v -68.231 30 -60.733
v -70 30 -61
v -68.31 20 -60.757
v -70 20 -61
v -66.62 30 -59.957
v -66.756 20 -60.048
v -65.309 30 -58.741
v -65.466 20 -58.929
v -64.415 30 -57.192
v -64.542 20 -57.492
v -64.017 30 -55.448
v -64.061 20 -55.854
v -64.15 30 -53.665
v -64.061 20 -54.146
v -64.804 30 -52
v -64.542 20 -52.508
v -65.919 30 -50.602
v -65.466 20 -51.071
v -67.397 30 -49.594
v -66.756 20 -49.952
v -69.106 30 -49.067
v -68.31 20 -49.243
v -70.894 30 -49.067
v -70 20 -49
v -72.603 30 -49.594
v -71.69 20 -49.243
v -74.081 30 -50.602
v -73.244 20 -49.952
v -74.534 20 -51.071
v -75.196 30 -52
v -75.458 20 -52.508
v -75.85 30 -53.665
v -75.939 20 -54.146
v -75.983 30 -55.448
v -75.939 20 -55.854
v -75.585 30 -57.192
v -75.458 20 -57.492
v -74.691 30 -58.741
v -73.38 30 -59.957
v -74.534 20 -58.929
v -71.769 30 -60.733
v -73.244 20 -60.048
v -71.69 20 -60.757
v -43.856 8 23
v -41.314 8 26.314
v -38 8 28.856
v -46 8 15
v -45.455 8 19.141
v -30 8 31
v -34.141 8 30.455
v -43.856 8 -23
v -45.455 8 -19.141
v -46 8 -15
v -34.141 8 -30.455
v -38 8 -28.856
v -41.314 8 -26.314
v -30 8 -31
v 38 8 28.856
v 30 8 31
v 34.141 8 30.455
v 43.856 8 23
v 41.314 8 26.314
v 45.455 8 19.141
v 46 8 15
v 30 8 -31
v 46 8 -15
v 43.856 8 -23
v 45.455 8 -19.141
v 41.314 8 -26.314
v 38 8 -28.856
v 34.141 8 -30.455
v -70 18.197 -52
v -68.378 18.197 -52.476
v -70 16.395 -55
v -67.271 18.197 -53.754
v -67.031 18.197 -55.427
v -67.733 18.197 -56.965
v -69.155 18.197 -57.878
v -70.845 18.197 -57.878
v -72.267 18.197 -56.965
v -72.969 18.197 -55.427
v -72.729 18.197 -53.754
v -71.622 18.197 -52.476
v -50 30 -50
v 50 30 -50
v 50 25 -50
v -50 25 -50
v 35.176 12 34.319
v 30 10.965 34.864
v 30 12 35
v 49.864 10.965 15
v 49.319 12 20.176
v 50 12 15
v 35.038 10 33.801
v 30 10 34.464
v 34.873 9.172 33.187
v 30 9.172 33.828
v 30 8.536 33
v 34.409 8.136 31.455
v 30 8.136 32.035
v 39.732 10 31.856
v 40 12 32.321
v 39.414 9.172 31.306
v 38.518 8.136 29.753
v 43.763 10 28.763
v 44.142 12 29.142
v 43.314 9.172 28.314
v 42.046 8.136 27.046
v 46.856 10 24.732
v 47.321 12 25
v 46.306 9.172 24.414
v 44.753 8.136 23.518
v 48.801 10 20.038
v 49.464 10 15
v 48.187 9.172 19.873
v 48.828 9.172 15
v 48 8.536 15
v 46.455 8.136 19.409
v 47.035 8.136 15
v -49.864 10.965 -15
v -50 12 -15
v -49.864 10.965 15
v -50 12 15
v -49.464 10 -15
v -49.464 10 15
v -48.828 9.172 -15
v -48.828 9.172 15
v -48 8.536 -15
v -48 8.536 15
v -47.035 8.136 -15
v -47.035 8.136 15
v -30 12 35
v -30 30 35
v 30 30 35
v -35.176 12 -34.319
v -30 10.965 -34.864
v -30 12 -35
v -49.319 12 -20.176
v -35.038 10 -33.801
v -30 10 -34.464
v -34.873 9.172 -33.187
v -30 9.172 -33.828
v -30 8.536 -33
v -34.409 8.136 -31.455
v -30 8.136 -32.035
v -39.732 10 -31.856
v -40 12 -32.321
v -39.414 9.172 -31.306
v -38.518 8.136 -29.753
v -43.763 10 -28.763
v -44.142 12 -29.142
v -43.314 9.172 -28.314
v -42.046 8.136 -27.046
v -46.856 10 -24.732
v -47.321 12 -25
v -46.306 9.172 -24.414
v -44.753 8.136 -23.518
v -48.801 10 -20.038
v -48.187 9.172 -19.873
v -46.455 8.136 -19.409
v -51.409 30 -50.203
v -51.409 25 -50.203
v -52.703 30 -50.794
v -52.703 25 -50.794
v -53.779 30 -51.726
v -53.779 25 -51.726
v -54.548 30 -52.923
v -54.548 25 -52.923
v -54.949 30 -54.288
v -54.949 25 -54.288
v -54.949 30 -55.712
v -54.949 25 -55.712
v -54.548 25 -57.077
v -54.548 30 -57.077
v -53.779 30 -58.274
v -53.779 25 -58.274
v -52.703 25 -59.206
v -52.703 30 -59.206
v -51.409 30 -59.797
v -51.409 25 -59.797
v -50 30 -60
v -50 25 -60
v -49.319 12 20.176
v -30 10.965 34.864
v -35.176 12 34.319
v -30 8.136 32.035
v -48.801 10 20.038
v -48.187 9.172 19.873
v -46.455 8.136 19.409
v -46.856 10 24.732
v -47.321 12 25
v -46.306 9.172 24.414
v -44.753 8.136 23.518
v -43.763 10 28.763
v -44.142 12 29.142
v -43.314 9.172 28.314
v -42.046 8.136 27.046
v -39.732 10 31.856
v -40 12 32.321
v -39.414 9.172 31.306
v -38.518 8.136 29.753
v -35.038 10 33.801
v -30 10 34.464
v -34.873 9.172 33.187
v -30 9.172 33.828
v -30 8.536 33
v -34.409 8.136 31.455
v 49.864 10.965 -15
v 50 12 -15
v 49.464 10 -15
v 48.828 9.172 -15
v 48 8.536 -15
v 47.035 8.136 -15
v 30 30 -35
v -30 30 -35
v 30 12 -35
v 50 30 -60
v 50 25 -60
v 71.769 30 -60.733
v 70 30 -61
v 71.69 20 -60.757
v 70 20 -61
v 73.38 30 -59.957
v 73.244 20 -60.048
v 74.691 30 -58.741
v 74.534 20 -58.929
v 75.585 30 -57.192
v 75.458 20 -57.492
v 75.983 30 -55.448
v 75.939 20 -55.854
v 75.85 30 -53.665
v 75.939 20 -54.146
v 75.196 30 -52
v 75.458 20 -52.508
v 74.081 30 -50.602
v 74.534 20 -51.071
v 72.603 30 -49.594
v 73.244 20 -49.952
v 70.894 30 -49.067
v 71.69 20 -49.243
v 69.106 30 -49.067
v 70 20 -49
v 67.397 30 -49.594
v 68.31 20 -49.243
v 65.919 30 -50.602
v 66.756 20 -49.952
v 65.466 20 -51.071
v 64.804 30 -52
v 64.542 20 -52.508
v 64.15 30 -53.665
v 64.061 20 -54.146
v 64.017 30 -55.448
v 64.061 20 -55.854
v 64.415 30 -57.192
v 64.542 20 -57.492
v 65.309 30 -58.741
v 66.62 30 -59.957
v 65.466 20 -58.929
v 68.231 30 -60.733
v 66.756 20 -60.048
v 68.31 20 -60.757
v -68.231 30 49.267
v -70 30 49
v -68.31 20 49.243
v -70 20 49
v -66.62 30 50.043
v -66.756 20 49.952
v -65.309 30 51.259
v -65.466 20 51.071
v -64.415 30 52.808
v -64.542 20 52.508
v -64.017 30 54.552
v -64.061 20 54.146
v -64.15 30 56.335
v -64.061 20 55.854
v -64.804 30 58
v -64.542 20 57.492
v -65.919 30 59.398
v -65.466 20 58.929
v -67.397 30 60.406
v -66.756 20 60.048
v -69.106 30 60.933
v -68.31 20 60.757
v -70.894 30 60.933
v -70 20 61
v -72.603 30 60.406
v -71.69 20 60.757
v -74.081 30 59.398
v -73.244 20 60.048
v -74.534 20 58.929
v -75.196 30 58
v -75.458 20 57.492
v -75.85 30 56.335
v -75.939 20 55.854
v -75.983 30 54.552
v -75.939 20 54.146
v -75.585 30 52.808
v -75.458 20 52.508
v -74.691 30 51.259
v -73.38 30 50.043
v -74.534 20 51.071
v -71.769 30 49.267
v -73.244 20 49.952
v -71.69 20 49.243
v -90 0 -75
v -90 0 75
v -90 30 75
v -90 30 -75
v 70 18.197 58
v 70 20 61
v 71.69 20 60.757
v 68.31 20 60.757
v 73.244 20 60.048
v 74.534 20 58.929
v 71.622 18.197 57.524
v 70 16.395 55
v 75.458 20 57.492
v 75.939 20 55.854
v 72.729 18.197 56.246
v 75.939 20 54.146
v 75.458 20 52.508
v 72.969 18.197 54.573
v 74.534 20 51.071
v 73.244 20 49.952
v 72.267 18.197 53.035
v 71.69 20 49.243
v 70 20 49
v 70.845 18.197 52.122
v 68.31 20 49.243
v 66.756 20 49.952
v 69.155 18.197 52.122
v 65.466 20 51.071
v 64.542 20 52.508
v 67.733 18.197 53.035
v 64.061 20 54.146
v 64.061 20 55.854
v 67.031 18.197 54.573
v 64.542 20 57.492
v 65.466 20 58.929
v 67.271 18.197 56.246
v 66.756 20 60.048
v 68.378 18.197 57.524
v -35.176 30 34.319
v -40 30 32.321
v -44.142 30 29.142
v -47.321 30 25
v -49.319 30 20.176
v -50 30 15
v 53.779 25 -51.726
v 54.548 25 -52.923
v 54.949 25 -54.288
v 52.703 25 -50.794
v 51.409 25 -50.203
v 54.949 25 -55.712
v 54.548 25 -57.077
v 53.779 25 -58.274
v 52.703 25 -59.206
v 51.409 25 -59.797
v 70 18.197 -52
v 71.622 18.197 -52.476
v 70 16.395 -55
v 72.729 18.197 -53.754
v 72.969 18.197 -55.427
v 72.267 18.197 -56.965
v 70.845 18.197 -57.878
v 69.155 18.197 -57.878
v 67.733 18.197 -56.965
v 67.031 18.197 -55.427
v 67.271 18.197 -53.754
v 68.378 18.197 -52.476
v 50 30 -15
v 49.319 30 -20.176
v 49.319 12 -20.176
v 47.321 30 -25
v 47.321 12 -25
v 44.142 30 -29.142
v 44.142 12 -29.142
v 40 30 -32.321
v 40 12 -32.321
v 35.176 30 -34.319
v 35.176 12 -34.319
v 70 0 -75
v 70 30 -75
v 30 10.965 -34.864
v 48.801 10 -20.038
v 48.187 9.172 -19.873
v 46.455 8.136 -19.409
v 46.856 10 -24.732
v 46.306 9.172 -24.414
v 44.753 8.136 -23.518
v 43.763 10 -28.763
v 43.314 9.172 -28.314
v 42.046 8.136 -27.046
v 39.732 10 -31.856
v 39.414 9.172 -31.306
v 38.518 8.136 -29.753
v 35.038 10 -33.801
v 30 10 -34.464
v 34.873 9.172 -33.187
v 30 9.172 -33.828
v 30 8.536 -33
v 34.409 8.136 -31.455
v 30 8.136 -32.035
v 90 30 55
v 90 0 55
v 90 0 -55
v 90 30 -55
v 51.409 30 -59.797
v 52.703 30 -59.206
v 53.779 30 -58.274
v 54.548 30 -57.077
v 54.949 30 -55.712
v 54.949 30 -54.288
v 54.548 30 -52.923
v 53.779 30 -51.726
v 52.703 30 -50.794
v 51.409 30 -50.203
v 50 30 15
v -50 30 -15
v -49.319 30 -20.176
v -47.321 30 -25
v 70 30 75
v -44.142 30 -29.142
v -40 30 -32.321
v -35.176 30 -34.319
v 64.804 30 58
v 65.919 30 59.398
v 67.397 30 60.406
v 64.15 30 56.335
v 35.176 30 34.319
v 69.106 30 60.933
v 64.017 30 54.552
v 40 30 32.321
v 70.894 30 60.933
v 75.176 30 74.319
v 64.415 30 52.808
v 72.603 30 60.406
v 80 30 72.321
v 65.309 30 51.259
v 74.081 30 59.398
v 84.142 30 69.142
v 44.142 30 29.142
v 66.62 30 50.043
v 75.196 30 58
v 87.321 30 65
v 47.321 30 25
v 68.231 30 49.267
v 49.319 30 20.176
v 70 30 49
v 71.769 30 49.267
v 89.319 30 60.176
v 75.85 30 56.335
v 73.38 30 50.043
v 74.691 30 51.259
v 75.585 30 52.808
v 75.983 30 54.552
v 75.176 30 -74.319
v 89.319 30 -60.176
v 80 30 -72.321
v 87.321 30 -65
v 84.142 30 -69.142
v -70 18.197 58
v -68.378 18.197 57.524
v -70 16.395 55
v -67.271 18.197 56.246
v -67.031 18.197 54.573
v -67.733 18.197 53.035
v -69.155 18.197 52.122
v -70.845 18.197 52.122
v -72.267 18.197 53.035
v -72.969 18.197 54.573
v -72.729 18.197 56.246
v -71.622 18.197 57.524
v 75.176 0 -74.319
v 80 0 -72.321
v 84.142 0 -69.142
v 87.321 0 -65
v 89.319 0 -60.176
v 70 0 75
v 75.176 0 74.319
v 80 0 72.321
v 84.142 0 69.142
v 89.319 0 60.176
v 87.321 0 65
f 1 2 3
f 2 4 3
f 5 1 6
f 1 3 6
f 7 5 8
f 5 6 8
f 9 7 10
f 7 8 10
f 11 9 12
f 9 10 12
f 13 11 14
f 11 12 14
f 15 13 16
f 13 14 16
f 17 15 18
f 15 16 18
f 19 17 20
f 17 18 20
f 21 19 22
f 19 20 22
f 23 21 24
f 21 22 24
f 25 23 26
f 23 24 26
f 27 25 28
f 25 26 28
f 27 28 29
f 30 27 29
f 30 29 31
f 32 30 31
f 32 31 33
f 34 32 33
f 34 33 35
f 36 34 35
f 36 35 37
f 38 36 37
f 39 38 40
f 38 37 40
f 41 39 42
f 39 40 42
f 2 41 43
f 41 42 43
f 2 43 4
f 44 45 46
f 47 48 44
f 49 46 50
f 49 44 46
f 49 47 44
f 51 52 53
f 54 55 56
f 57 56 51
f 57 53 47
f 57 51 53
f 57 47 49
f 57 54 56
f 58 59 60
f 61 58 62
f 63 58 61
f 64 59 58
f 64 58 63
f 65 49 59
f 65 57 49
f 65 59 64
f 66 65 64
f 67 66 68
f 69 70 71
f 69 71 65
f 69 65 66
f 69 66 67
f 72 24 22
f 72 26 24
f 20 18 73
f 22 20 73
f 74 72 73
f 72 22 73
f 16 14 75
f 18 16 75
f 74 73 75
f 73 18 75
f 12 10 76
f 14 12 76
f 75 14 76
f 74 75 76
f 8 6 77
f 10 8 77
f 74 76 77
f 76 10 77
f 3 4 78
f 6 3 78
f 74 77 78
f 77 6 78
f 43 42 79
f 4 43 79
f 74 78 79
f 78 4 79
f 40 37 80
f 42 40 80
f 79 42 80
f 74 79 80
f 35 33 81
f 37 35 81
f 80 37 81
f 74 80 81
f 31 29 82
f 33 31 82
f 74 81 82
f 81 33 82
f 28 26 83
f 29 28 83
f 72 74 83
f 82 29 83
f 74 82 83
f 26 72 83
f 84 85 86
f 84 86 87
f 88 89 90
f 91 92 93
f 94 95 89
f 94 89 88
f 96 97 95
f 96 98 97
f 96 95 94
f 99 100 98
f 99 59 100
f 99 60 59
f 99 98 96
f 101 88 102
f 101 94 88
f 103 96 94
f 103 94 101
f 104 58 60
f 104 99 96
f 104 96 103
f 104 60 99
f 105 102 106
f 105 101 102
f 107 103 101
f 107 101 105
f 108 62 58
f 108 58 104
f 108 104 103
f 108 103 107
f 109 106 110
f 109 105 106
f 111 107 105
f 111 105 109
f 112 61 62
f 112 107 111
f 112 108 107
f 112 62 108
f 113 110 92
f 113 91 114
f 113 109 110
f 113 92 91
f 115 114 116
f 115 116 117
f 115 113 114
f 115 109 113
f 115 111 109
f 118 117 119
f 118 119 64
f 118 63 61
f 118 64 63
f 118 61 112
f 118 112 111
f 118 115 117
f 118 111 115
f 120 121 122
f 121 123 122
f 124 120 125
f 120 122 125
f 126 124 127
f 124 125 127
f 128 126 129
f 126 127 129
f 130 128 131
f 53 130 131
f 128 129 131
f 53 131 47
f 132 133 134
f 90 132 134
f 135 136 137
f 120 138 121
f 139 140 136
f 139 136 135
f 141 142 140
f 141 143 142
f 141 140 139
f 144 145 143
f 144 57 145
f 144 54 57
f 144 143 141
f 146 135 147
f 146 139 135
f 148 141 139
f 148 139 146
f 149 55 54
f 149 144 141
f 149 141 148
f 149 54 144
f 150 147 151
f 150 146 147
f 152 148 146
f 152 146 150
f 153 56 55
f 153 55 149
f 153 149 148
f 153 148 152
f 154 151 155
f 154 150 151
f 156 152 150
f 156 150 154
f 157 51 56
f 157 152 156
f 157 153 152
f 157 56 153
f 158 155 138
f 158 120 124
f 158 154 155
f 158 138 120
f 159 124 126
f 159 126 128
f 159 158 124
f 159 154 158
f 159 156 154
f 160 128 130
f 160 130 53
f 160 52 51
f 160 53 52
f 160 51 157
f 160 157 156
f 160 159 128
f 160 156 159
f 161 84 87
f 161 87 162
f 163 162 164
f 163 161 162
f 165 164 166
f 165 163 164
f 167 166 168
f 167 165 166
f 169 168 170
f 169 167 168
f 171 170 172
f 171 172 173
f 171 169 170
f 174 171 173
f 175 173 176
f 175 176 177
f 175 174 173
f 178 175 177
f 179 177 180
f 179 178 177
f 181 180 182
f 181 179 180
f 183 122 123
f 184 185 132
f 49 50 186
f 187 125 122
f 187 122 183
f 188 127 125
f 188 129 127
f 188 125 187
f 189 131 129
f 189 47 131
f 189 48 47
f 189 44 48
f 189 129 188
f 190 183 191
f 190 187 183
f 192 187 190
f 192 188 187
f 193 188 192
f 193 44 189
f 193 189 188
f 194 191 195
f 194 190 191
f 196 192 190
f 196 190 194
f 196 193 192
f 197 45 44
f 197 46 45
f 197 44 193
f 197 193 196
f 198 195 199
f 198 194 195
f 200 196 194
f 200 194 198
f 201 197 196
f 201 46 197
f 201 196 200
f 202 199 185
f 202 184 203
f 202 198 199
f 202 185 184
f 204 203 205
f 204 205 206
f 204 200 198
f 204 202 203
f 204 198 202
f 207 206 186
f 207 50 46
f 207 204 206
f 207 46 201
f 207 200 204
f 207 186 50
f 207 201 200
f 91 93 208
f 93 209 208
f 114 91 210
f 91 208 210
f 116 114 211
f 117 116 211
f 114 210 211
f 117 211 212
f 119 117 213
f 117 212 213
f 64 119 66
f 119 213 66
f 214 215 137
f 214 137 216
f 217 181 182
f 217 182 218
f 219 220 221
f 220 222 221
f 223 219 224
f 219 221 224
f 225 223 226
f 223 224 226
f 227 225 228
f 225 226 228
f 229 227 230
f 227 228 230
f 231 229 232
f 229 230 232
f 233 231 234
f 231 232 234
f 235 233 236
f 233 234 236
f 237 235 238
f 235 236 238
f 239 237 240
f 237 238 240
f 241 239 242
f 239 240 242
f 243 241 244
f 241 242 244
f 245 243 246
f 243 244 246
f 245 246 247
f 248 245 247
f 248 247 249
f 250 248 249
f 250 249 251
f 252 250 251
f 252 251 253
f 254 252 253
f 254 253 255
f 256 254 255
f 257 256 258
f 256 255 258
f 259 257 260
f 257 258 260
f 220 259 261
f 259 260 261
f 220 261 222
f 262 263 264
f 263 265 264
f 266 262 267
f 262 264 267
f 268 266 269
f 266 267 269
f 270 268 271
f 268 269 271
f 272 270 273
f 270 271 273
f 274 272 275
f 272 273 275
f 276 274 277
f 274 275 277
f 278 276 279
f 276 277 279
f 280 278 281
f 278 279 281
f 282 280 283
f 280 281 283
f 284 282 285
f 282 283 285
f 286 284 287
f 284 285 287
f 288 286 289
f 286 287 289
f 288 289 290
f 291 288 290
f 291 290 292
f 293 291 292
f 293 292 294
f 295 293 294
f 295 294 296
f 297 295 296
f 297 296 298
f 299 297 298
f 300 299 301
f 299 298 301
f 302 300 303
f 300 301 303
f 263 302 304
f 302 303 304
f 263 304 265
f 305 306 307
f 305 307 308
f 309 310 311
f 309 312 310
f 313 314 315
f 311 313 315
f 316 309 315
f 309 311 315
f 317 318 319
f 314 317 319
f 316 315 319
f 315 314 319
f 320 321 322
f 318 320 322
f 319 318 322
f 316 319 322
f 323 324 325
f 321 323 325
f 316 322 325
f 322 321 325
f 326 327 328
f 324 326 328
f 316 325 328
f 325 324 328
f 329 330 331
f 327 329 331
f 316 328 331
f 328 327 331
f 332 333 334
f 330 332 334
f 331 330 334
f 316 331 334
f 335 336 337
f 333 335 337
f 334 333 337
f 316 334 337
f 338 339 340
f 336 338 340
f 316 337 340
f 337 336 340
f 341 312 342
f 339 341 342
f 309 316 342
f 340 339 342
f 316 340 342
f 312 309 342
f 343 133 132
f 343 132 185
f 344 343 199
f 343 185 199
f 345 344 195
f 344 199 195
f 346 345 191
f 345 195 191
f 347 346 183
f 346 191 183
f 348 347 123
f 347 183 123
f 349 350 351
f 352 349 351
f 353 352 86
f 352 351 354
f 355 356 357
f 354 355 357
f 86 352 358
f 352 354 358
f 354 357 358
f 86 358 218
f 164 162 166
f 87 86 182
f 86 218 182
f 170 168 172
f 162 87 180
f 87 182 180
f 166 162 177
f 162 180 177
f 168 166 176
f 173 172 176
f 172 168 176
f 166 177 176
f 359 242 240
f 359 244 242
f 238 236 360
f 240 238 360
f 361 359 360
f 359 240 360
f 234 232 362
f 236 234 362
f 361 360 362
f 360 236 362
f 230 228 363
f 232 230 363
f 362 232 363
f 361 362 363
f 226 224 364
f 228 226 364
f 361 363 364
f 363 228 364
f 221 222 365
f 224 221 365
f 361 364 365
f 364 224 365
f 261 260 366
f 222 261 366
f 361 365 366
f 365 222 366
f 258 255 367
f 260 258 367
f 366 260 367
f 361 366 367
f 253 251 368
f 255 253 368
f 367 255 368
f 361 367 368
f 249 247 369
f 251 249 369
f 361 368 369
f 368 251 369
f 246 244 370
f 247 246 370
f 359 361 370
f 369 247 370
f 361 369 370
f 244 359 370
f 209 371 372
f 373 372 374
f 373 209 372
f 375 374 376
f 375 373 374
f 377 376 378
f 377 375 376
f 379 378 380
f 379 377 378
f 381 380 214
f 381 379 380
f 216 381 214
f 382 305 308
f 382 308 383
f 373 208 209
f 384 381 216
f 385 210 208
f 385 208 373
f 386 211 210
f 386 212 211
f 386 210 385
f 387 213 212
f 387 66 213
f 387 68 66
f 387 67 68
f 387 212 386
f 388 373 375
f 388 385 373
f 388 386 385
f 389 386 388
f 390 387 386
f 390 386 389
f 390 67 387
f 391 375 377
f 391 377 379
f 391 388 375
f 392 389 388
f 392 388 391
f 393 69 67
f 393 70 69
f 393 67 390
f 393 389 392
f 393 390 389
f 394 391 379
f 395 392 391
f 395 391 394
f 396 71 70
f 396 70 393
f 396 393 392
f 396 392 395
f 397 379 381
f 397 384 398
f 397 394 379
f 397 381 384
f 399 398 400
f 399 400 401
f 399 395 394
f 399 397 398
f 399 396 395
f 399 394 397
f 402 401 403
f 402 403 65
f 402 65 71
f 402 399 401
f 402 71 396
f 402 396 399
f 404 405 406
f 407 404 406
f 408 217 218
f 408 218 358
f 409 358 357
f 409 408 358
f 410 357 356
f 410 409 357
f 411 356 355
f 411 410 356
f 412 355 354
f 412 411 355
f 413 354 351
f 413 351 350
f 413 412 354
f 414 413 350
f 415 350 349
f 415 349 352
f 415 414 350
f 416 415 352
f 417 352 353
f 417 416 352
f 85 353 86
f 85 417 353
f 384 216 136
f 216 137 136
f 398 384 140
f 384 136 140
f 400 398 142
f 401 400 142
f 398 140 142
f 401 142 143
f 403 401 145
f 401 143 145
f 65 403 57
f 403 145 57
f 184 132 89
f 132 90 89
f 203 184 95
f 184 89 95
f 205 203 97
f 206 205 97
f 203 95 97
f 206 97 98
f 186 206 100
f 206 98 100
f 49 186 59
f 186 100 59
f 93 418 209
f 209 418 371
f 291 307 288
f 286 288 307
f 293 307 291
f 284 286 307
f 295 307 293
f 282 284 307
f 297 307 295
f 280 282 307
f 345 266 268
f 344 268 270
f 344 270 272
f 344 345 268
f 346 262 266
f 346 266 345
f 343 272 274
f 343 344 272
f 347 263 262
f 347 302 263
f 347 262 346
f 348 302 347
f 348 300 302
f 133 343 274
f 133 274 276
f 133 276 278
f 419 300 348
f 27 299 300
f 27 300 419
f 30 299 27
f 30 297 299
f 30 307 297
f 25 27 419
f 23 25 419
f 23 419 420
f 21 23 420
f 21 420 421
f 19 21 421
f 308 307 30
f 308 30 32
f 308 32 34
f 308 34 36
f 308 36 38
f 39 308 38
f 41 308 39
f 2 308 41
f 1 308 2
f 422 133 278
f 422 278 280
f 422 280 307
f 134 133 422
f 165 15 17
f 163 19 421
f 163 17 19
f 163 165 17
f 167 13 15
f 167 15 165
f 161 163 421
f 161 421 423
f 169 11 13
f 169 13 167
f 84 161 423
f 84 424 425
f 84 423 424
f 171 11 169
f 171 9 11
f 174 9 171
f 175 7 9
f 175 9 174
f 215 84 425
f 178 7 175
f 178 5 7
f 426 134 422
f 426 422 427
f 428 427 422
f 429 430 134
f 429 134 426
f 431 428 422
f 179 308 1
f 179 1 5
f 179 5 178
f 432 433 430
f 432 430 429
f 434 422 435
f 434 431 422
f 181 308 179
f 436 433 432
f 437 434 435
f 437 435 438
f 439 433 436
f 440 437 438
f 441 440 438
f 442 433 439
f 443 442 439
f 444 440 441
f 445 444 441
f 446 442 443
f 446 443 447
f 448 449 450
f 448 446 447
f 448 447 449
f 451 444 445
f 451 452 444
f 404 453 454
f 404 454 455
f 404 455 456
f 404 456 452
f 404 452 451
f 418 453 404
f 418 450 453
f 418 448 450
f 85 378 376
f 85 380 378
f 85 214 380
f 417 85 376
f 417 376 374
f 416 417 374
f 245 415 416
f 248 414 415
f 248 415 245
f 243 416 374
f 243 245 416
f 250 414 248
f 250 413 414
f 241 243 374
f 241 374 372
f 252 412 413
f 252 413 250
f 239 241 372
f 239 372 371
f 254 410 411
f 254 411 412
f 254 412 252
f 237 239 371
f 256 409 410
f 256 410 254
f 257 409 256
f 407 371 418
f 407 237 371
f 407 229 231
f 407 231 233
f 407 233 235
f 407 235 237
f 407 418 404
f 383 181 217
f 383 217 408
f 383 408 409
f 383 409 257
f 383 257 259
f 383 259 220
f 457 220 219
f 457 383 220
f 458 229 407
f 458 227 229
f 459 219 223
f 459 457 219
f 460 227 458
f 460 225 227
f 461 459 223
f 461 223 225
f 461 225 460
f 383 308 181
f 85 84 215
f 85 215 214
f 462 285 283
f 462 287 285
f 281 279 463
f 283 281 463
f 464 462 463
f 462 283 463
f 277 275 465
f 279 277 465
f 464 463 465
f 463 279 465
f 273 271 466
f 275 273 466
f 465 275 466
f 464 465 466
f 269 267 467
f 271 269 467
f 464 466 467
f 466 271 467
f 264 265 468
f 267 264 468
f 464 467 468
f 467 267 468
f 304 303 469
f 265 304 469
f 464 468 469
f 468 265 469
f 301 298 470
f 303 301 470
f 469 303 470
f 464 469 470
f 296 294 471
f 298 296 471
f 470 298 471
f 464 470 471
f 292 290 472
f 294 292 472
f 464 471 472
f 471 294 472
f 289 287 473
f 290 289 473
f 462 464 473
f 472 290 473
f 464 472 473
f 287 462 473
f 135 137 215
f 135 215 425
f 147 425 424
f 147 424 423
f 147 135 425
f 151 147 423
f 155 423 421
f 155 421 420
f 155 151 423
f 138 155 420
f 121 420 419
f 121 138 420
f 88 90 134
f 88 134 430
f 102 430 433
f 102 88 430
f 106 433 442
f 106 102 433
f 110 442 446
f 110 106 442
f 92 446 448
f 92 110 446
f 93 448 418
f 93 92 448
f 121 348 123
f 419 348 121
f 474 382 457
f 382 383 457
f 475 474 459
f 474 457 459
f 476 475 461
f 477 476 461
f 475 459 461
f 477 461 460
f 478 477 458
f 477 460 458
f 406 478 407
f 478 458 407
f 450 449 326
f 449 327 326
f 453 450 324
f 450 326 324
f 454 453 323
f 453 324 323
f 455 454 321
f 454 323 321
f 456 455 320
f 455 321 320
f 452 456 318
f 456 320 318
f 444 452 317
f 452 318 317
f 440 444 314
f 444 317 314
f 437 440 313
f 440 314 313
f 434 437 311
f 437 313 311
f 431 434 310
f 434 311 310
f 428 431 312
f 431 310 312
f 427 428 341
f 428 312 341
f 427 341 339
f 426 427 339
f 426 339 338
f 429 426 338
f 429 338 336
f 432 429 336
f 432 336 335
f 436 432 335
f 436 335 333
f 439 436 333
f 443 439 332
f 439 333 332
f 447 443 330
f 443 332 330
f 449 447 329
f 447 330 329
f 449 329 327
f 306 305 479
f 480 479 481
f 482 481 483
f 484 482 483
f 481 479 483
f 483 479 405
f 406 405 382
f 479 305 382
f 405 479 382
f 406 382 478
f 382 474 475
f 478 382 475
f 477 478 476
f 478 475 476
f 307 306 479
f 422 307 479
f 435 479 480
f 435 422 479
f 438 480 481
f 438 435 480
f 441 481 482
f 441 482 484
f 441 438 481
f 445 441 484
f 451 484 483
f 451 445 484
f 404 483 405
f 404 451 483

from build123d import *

# Parameters (mm, degrees)
SKETCH1_W                  = 180
SKETCH1_H                  = 150
BOSS_EXTRUDE1_DEPTH        = 30
F_16_0MM_DOWEL_HOLE1_D     = 12
F_16_0MM_DOWEL_HOLE1_DEPTH = 10
F_16_0MM_DOWEL_HOLE1_TIP   = 3.605163714
SKETCH5_W                  = 100
SKETCH5_H                  = 70
CUT_EXTRUDE1_DEPTH         = 22
FILLET1_R                  = 20
FILLET2_R                  = 20
CUT_EXTRUDE2_DEPTH         = 5
FILLET3_R                  = 4


with BuildPart() as part:
    # Sketch1 → Boss-Extrude1 (new body)
    with BuildSketch(Plane(origin=(0, 0, 0), x_dir=(1, 0, 0), z_dir=(0, 1, 0))):
        Rectangle(SKETCH1_W, SKETCH1_H)
    extrude(amount=BOSS_EXTRUDE1_DEPTH)

    # Ø16.0mm Dowel Hole1
    with Locations(Plane(origin=(-70, 30, 55), x_dir=(0, 0, 1), z_dir=(0, 1, 0))):
        with Locations((0, 0), (-110, 0), (-110, 140), (0, 140)):
            Hole(F_16_0MM_DOWEL_HOLE1_D / 2, depth=F_16_0MM_DOWEL_HOLE1_DEPTH)
            with Locations((0, 0, -(F_16_0MM_DOWEL_HOLE1_DEPTH + F_16_0MM_DOWEL_HOLE1_TIP / 2))):  # 118° drill point
                Cone(0, F_16_0MM_DOWEL_HOLE1_D / 2, F_16_0MM_DOWEL_HOLE1_TIP, mode=Mode.SUBTRACT)

    # Sketch5 → Cut-Extrude1 (cut)
    with BuildSketch(Plane(origin=(0, 30, 0), x_dir=(1, 0, 0), z_dir=(0, 1, 0))):
        Rectangle(SKETCH5_W, SKETCH5_H)
    extrude(amount=-CUT_EXTRUDE1_DEPTH, mode=Mode.SUBTRACT)

    # Fillet1
    fillet1_edges = [part.edges().sort_by_distance(p)[0] for p in [
        (50, 19, -35),
        (-50, 19, -35),
        (-50, 19, 35),
        (50, 19, 35),
    ]]
    fillet(fillet1_edges, radius=FILLET1_R)

    # Fillet2
    fillet2_edges = [part.edges().sort_by_distance(p)[0] for p in [
        (90, 15, 75),
        (90, 15, -75),
    ]]
    fillet(fillet2_edges, radius=FILLET2_R)

    # Sketch6 → Cut-Extrude2 (cut)
    with BuildSketch(Plane(origin=(0, 30, 0), x_dir=(1, 0, 0), z_dir=(0, 1, 0))):
        with BuildLine():
            Line((-50, 60), (50, 60))
            ThreePointArc((50, 60), (55, 55), (50, 50))
            Line((50, 50), (-50, 50))
            ThreePointArc((-50, 50), (-55, 55), (-50, 60))
        make_face()
    extrude(amount=-CUT_EXTRUDE2_DEPTH, mode=Mode.SUBTRACT)

    # Fillet3
    fillet3_edges = [part.edges().sort_by_distance(p)[0] for p in [
        (50, 8, 0),
        (0, 8, 35),
        (0, 8, -35),
        (-50, 8, 0),
        (-44.142135624, 8, -29.142135624),
        (44.142135624, 8, -29.142135624),
        (-44.142135624, 8, 29.142135624),
        (44.142135624, 8, 29.142135624),
    ]]
    fillet(fillet3_edges, radius=FILLET3_R)


solid = part.part
